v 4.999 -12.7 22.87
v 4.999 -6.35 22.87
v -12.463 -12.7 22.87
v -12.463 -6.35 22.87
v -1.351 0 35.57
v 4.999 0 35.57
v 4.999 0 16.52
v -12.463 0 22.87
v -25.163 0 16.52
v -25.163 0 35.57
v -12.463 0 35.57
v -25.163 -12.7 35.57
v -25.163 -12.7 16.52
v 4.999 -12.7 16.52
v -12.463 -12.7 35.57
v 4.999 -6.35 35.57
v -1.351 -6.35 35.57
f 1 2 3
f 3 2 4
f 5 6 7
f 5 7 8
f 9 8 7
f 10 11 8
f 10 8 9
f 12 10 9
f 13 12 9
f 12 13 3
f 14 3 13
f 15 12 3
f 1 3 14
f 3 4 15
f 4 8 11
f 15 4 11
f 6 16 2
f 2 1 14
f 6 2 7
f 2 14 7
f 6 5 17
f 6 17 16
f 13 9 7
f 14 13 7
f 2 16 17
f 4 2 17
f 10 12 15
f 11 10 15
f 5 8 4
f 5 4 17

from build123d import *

# Parameters (mm, degrees)
F0_W     = 12.7
F0_H     = 12.7
F1_DEPTH = 12.7
F2_W     = 6.35
F2_H     = 6.35
F3_DEPTH = 12.7
F5_DEPTH = 6.35


with BuildPart() as f1:
    # F0 (on Front) → F1 (new body)
    with BuildSketch(Plane.XZ):
        with Locations((-18.813286, 29.219552)):
            Rectangle(F0_W, F0_H)
        Polygon((-12.463286, 22.869552), (-25.163286, 22.869552), (-25.163286, 16.519552), (4.999214, 16.519552), (4.999214, 22.869552), align=None)
    extrude(amount=F1_DEPTH)

    # F2 (on face) → F3 (join)
    with BuildSketch(Plane.XY.offset(22.869552)):
        with Locations((1.824214, -3.175)):
            Rectangle(F2_W, F2_H)
    extrude(amount=F3_DEPTH)

    # F4 (on face) → F5 (join)
    with BuildSketch(Plane(origin=(0, 0, 0), x_dir=(-1, 0, 0), z_dir=(0, 1, 0))):
        Polygon((12.463286, 22.869552), (1.350786, 35.569552), (1.350786, 22.869552), align=None)
    extrude(amount=-F5_DEPTH)


solid = f1.part
